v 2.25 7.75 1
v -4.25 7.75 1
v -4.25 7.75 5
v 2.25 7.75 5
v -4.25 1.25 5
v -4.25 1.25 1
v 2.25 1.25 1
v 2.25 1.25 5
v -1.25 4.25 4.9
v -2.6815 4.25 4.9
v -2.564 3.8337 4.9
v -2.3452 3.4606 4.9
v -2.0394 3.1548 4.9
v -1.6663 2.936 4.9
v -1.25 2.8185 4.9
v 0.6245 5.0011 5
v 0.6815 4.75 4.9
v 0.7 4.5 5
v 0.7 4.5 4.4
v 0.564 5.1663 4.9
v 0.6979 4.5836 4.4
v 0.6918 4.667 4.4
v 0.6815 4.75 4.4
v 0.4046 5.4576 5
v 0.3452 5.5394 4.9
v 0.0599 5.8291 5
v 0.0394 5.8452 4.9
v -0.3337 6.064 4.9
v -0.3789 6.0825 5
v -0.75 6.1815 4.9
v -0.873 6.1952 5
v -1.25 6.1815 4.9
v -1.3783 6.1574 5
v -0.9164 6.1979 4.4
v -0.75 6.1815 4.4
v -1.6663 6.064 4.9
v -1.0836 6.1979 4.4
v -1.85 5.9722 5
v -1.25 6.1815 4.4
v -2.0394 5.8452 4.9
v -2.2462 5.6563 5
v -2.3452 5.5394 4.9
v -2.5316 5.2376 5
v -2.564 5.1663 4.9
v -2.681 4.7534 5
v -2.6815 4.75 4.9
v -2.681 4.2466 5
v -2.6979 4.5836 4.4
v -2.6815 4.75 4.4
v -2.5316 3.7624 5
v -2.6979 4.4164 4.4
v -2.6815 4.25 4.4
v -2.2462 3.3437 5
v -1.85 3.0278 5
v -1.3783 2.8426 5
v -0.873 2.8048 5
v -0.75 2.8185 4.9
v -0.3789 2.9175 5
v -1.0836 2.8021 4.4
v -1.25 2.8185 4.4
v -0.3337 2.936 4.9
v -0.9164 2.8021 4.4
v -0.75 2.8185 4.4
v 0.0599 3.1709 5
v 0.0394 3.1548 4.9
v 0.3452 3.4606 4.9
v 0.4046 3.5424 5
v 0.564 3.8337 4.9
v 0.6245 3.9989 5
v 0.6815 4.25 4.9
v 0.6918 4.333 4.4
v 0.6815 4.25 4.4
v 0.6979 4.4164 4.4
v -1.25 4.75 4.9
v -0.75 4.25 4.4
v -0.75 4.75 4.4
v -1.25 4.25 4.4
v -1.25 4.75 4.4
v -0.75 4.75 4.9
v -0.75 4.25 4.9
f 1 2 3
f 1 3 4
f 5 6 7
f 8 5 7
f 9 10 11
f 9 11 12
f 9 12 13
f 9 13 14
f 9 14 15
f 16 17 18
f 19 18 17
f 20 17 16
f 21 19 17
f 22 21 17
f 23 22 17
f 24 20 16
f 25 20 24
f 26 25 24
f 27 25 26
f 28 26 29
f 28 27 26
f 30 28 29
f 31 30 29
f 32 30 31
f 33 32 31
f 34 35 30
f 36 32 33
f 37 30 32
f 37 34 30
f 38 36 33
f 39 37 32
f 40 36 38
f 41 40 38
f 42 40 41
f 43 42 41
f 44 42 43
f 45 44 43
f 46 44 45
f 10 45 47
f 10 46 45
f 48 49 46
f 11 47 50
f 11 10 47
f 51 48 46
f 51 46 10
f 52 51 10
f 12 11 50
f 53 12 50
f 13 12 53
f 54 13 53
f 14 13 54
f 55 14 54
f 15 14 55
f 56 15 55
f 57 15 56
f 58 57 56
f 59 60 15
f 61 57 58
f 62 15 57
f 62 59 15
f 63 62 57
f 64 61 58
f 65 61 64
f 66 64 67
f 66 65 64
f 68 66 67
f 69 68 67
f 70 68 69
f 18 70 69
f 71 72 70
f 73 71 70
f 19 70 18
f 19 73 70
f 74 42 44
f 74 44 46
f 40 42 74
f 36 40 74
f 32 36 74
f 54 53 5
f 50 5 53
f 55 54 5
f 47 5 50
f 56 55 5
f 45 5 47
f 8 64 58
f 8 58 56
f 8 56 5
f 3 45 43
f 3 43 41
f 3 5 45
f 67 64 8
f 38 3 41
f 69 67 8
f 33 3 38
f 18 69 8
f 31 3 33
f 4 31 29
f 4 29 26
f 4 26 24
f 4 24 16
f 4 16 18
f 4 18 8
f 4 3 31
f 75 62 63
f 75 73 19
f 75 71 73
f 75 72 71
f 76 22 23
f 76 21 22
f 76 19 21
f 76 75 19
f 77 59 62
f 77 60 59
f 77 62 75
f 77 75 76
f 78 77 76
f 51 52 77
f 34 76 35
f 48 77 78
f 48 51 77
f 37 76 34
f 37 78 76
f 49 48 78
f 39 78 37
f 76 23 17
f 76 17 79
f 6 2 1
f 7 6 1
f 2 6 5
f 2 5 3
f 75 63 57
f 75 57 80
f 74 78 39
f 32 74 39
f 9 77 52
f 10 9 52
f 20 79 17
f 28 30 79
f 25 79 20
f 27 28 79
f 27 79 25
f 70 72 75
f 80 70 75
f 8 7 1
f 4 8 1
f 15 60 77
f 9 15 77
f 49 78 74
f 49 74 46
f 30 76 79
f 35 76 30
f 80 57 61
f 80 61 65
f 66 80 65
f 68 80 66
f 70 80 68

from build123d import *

# Parameters (mm, degrees)
BOX011_W               = 0.5
BOX011_H               = 5
BOX011_DEPTH           = 3
BOX011_PLACEMENT_ANGLE = 90
BOX012_W               = 0.5
BOX012_H               = 5
BOX012_DEPTH           = 3
CYLINDER_R             = 1.7
CYLINDER_DEPTH         = 3.9
CYLINDER001_R          = 1.7
CYLINDER001_DEPTH      = 5
BOX010_W               = 6.5
BOX010_H               = 6.5
BOX010_DEPTH           = 4


with BuildPart() as cubo011:
    # Box011 → Box011 (new body)
    with BuildSketch(Plane.XY):
        with Locations((0.25, 2.5)):
            Rectangle(BOX011_W, BOX011_H)
    extrude(amount=BOX011_DEPTH)


with BuildPart() as cubo011_1:
    # Box011 placement: moved
    add(cubo011.part.moved(Location((2.75, -0.25, 3.4))).rotate(Axis((2.75, -0.25, 3.4), (0, 0, 1)), BOX011_PLACEMENT_ANGLE))


with BuildPart() as cubo012:
    # Box012 → Box012 (new body)
    with BuildSketch(Plane(origin=(-0.25, -3, 3.4), x_dir=(1, 0, 0), z_dir=(0, 0, 1))):
        with Locations((0.25, 2.5)):
            Rectangle(BOX012_W, BOX012_H)
    extrude(amount=BOX012_DEPTH)


with BuildPart() as cut004:
    # Cylinder → Cylinder (new body)
    with BuildSketch(Plane.XY):
        Circle(CYLINDER_R)
    extrude(amount=CYLINDER_DEPTH)

    # Cut003: cut Cubo012
    add(cubo012.part, mode=Mode.SUBTRACT)

    # Cut004: cut Cubo011
    add(cubo011_1.part, mode=Mode.SUBTRACT)


with BuildPart() as cilindro001:
    # Cylinder001 → Cylinder001 (new body)
    with BuildSketch(Plane.XY):
        Circle(CYLINDER001_R)
    extrude(amount=CYLINDER001_DEPTH)


with BuildPart() as potentiometer:
    # Box010 → Box010 (new body)
    with BuildSketch(Plane(origin=(-3.25, -3.25, 0), x_dir=(1, 0, 0), z_dir=(0, 0, 1))):
        with Locations((3.25, 3.25)):
            Rectangle(BOX010_W, BOX010_H)
    extrude(amount=BOX010_DEPTH)

    # Cut002: cut Cilindro001
    add(cilindro001.part, mode=Mode.SUBTRACT)

    # Fusion003: union Cut004
    add(cut004.part)


with BuildPart() as potentiometer_1:
    # Fusion003 placement: moved
    add(potentiometer.part.moved(Location((-1, 4.5, 1))))


solid = potentiometer_1.part
